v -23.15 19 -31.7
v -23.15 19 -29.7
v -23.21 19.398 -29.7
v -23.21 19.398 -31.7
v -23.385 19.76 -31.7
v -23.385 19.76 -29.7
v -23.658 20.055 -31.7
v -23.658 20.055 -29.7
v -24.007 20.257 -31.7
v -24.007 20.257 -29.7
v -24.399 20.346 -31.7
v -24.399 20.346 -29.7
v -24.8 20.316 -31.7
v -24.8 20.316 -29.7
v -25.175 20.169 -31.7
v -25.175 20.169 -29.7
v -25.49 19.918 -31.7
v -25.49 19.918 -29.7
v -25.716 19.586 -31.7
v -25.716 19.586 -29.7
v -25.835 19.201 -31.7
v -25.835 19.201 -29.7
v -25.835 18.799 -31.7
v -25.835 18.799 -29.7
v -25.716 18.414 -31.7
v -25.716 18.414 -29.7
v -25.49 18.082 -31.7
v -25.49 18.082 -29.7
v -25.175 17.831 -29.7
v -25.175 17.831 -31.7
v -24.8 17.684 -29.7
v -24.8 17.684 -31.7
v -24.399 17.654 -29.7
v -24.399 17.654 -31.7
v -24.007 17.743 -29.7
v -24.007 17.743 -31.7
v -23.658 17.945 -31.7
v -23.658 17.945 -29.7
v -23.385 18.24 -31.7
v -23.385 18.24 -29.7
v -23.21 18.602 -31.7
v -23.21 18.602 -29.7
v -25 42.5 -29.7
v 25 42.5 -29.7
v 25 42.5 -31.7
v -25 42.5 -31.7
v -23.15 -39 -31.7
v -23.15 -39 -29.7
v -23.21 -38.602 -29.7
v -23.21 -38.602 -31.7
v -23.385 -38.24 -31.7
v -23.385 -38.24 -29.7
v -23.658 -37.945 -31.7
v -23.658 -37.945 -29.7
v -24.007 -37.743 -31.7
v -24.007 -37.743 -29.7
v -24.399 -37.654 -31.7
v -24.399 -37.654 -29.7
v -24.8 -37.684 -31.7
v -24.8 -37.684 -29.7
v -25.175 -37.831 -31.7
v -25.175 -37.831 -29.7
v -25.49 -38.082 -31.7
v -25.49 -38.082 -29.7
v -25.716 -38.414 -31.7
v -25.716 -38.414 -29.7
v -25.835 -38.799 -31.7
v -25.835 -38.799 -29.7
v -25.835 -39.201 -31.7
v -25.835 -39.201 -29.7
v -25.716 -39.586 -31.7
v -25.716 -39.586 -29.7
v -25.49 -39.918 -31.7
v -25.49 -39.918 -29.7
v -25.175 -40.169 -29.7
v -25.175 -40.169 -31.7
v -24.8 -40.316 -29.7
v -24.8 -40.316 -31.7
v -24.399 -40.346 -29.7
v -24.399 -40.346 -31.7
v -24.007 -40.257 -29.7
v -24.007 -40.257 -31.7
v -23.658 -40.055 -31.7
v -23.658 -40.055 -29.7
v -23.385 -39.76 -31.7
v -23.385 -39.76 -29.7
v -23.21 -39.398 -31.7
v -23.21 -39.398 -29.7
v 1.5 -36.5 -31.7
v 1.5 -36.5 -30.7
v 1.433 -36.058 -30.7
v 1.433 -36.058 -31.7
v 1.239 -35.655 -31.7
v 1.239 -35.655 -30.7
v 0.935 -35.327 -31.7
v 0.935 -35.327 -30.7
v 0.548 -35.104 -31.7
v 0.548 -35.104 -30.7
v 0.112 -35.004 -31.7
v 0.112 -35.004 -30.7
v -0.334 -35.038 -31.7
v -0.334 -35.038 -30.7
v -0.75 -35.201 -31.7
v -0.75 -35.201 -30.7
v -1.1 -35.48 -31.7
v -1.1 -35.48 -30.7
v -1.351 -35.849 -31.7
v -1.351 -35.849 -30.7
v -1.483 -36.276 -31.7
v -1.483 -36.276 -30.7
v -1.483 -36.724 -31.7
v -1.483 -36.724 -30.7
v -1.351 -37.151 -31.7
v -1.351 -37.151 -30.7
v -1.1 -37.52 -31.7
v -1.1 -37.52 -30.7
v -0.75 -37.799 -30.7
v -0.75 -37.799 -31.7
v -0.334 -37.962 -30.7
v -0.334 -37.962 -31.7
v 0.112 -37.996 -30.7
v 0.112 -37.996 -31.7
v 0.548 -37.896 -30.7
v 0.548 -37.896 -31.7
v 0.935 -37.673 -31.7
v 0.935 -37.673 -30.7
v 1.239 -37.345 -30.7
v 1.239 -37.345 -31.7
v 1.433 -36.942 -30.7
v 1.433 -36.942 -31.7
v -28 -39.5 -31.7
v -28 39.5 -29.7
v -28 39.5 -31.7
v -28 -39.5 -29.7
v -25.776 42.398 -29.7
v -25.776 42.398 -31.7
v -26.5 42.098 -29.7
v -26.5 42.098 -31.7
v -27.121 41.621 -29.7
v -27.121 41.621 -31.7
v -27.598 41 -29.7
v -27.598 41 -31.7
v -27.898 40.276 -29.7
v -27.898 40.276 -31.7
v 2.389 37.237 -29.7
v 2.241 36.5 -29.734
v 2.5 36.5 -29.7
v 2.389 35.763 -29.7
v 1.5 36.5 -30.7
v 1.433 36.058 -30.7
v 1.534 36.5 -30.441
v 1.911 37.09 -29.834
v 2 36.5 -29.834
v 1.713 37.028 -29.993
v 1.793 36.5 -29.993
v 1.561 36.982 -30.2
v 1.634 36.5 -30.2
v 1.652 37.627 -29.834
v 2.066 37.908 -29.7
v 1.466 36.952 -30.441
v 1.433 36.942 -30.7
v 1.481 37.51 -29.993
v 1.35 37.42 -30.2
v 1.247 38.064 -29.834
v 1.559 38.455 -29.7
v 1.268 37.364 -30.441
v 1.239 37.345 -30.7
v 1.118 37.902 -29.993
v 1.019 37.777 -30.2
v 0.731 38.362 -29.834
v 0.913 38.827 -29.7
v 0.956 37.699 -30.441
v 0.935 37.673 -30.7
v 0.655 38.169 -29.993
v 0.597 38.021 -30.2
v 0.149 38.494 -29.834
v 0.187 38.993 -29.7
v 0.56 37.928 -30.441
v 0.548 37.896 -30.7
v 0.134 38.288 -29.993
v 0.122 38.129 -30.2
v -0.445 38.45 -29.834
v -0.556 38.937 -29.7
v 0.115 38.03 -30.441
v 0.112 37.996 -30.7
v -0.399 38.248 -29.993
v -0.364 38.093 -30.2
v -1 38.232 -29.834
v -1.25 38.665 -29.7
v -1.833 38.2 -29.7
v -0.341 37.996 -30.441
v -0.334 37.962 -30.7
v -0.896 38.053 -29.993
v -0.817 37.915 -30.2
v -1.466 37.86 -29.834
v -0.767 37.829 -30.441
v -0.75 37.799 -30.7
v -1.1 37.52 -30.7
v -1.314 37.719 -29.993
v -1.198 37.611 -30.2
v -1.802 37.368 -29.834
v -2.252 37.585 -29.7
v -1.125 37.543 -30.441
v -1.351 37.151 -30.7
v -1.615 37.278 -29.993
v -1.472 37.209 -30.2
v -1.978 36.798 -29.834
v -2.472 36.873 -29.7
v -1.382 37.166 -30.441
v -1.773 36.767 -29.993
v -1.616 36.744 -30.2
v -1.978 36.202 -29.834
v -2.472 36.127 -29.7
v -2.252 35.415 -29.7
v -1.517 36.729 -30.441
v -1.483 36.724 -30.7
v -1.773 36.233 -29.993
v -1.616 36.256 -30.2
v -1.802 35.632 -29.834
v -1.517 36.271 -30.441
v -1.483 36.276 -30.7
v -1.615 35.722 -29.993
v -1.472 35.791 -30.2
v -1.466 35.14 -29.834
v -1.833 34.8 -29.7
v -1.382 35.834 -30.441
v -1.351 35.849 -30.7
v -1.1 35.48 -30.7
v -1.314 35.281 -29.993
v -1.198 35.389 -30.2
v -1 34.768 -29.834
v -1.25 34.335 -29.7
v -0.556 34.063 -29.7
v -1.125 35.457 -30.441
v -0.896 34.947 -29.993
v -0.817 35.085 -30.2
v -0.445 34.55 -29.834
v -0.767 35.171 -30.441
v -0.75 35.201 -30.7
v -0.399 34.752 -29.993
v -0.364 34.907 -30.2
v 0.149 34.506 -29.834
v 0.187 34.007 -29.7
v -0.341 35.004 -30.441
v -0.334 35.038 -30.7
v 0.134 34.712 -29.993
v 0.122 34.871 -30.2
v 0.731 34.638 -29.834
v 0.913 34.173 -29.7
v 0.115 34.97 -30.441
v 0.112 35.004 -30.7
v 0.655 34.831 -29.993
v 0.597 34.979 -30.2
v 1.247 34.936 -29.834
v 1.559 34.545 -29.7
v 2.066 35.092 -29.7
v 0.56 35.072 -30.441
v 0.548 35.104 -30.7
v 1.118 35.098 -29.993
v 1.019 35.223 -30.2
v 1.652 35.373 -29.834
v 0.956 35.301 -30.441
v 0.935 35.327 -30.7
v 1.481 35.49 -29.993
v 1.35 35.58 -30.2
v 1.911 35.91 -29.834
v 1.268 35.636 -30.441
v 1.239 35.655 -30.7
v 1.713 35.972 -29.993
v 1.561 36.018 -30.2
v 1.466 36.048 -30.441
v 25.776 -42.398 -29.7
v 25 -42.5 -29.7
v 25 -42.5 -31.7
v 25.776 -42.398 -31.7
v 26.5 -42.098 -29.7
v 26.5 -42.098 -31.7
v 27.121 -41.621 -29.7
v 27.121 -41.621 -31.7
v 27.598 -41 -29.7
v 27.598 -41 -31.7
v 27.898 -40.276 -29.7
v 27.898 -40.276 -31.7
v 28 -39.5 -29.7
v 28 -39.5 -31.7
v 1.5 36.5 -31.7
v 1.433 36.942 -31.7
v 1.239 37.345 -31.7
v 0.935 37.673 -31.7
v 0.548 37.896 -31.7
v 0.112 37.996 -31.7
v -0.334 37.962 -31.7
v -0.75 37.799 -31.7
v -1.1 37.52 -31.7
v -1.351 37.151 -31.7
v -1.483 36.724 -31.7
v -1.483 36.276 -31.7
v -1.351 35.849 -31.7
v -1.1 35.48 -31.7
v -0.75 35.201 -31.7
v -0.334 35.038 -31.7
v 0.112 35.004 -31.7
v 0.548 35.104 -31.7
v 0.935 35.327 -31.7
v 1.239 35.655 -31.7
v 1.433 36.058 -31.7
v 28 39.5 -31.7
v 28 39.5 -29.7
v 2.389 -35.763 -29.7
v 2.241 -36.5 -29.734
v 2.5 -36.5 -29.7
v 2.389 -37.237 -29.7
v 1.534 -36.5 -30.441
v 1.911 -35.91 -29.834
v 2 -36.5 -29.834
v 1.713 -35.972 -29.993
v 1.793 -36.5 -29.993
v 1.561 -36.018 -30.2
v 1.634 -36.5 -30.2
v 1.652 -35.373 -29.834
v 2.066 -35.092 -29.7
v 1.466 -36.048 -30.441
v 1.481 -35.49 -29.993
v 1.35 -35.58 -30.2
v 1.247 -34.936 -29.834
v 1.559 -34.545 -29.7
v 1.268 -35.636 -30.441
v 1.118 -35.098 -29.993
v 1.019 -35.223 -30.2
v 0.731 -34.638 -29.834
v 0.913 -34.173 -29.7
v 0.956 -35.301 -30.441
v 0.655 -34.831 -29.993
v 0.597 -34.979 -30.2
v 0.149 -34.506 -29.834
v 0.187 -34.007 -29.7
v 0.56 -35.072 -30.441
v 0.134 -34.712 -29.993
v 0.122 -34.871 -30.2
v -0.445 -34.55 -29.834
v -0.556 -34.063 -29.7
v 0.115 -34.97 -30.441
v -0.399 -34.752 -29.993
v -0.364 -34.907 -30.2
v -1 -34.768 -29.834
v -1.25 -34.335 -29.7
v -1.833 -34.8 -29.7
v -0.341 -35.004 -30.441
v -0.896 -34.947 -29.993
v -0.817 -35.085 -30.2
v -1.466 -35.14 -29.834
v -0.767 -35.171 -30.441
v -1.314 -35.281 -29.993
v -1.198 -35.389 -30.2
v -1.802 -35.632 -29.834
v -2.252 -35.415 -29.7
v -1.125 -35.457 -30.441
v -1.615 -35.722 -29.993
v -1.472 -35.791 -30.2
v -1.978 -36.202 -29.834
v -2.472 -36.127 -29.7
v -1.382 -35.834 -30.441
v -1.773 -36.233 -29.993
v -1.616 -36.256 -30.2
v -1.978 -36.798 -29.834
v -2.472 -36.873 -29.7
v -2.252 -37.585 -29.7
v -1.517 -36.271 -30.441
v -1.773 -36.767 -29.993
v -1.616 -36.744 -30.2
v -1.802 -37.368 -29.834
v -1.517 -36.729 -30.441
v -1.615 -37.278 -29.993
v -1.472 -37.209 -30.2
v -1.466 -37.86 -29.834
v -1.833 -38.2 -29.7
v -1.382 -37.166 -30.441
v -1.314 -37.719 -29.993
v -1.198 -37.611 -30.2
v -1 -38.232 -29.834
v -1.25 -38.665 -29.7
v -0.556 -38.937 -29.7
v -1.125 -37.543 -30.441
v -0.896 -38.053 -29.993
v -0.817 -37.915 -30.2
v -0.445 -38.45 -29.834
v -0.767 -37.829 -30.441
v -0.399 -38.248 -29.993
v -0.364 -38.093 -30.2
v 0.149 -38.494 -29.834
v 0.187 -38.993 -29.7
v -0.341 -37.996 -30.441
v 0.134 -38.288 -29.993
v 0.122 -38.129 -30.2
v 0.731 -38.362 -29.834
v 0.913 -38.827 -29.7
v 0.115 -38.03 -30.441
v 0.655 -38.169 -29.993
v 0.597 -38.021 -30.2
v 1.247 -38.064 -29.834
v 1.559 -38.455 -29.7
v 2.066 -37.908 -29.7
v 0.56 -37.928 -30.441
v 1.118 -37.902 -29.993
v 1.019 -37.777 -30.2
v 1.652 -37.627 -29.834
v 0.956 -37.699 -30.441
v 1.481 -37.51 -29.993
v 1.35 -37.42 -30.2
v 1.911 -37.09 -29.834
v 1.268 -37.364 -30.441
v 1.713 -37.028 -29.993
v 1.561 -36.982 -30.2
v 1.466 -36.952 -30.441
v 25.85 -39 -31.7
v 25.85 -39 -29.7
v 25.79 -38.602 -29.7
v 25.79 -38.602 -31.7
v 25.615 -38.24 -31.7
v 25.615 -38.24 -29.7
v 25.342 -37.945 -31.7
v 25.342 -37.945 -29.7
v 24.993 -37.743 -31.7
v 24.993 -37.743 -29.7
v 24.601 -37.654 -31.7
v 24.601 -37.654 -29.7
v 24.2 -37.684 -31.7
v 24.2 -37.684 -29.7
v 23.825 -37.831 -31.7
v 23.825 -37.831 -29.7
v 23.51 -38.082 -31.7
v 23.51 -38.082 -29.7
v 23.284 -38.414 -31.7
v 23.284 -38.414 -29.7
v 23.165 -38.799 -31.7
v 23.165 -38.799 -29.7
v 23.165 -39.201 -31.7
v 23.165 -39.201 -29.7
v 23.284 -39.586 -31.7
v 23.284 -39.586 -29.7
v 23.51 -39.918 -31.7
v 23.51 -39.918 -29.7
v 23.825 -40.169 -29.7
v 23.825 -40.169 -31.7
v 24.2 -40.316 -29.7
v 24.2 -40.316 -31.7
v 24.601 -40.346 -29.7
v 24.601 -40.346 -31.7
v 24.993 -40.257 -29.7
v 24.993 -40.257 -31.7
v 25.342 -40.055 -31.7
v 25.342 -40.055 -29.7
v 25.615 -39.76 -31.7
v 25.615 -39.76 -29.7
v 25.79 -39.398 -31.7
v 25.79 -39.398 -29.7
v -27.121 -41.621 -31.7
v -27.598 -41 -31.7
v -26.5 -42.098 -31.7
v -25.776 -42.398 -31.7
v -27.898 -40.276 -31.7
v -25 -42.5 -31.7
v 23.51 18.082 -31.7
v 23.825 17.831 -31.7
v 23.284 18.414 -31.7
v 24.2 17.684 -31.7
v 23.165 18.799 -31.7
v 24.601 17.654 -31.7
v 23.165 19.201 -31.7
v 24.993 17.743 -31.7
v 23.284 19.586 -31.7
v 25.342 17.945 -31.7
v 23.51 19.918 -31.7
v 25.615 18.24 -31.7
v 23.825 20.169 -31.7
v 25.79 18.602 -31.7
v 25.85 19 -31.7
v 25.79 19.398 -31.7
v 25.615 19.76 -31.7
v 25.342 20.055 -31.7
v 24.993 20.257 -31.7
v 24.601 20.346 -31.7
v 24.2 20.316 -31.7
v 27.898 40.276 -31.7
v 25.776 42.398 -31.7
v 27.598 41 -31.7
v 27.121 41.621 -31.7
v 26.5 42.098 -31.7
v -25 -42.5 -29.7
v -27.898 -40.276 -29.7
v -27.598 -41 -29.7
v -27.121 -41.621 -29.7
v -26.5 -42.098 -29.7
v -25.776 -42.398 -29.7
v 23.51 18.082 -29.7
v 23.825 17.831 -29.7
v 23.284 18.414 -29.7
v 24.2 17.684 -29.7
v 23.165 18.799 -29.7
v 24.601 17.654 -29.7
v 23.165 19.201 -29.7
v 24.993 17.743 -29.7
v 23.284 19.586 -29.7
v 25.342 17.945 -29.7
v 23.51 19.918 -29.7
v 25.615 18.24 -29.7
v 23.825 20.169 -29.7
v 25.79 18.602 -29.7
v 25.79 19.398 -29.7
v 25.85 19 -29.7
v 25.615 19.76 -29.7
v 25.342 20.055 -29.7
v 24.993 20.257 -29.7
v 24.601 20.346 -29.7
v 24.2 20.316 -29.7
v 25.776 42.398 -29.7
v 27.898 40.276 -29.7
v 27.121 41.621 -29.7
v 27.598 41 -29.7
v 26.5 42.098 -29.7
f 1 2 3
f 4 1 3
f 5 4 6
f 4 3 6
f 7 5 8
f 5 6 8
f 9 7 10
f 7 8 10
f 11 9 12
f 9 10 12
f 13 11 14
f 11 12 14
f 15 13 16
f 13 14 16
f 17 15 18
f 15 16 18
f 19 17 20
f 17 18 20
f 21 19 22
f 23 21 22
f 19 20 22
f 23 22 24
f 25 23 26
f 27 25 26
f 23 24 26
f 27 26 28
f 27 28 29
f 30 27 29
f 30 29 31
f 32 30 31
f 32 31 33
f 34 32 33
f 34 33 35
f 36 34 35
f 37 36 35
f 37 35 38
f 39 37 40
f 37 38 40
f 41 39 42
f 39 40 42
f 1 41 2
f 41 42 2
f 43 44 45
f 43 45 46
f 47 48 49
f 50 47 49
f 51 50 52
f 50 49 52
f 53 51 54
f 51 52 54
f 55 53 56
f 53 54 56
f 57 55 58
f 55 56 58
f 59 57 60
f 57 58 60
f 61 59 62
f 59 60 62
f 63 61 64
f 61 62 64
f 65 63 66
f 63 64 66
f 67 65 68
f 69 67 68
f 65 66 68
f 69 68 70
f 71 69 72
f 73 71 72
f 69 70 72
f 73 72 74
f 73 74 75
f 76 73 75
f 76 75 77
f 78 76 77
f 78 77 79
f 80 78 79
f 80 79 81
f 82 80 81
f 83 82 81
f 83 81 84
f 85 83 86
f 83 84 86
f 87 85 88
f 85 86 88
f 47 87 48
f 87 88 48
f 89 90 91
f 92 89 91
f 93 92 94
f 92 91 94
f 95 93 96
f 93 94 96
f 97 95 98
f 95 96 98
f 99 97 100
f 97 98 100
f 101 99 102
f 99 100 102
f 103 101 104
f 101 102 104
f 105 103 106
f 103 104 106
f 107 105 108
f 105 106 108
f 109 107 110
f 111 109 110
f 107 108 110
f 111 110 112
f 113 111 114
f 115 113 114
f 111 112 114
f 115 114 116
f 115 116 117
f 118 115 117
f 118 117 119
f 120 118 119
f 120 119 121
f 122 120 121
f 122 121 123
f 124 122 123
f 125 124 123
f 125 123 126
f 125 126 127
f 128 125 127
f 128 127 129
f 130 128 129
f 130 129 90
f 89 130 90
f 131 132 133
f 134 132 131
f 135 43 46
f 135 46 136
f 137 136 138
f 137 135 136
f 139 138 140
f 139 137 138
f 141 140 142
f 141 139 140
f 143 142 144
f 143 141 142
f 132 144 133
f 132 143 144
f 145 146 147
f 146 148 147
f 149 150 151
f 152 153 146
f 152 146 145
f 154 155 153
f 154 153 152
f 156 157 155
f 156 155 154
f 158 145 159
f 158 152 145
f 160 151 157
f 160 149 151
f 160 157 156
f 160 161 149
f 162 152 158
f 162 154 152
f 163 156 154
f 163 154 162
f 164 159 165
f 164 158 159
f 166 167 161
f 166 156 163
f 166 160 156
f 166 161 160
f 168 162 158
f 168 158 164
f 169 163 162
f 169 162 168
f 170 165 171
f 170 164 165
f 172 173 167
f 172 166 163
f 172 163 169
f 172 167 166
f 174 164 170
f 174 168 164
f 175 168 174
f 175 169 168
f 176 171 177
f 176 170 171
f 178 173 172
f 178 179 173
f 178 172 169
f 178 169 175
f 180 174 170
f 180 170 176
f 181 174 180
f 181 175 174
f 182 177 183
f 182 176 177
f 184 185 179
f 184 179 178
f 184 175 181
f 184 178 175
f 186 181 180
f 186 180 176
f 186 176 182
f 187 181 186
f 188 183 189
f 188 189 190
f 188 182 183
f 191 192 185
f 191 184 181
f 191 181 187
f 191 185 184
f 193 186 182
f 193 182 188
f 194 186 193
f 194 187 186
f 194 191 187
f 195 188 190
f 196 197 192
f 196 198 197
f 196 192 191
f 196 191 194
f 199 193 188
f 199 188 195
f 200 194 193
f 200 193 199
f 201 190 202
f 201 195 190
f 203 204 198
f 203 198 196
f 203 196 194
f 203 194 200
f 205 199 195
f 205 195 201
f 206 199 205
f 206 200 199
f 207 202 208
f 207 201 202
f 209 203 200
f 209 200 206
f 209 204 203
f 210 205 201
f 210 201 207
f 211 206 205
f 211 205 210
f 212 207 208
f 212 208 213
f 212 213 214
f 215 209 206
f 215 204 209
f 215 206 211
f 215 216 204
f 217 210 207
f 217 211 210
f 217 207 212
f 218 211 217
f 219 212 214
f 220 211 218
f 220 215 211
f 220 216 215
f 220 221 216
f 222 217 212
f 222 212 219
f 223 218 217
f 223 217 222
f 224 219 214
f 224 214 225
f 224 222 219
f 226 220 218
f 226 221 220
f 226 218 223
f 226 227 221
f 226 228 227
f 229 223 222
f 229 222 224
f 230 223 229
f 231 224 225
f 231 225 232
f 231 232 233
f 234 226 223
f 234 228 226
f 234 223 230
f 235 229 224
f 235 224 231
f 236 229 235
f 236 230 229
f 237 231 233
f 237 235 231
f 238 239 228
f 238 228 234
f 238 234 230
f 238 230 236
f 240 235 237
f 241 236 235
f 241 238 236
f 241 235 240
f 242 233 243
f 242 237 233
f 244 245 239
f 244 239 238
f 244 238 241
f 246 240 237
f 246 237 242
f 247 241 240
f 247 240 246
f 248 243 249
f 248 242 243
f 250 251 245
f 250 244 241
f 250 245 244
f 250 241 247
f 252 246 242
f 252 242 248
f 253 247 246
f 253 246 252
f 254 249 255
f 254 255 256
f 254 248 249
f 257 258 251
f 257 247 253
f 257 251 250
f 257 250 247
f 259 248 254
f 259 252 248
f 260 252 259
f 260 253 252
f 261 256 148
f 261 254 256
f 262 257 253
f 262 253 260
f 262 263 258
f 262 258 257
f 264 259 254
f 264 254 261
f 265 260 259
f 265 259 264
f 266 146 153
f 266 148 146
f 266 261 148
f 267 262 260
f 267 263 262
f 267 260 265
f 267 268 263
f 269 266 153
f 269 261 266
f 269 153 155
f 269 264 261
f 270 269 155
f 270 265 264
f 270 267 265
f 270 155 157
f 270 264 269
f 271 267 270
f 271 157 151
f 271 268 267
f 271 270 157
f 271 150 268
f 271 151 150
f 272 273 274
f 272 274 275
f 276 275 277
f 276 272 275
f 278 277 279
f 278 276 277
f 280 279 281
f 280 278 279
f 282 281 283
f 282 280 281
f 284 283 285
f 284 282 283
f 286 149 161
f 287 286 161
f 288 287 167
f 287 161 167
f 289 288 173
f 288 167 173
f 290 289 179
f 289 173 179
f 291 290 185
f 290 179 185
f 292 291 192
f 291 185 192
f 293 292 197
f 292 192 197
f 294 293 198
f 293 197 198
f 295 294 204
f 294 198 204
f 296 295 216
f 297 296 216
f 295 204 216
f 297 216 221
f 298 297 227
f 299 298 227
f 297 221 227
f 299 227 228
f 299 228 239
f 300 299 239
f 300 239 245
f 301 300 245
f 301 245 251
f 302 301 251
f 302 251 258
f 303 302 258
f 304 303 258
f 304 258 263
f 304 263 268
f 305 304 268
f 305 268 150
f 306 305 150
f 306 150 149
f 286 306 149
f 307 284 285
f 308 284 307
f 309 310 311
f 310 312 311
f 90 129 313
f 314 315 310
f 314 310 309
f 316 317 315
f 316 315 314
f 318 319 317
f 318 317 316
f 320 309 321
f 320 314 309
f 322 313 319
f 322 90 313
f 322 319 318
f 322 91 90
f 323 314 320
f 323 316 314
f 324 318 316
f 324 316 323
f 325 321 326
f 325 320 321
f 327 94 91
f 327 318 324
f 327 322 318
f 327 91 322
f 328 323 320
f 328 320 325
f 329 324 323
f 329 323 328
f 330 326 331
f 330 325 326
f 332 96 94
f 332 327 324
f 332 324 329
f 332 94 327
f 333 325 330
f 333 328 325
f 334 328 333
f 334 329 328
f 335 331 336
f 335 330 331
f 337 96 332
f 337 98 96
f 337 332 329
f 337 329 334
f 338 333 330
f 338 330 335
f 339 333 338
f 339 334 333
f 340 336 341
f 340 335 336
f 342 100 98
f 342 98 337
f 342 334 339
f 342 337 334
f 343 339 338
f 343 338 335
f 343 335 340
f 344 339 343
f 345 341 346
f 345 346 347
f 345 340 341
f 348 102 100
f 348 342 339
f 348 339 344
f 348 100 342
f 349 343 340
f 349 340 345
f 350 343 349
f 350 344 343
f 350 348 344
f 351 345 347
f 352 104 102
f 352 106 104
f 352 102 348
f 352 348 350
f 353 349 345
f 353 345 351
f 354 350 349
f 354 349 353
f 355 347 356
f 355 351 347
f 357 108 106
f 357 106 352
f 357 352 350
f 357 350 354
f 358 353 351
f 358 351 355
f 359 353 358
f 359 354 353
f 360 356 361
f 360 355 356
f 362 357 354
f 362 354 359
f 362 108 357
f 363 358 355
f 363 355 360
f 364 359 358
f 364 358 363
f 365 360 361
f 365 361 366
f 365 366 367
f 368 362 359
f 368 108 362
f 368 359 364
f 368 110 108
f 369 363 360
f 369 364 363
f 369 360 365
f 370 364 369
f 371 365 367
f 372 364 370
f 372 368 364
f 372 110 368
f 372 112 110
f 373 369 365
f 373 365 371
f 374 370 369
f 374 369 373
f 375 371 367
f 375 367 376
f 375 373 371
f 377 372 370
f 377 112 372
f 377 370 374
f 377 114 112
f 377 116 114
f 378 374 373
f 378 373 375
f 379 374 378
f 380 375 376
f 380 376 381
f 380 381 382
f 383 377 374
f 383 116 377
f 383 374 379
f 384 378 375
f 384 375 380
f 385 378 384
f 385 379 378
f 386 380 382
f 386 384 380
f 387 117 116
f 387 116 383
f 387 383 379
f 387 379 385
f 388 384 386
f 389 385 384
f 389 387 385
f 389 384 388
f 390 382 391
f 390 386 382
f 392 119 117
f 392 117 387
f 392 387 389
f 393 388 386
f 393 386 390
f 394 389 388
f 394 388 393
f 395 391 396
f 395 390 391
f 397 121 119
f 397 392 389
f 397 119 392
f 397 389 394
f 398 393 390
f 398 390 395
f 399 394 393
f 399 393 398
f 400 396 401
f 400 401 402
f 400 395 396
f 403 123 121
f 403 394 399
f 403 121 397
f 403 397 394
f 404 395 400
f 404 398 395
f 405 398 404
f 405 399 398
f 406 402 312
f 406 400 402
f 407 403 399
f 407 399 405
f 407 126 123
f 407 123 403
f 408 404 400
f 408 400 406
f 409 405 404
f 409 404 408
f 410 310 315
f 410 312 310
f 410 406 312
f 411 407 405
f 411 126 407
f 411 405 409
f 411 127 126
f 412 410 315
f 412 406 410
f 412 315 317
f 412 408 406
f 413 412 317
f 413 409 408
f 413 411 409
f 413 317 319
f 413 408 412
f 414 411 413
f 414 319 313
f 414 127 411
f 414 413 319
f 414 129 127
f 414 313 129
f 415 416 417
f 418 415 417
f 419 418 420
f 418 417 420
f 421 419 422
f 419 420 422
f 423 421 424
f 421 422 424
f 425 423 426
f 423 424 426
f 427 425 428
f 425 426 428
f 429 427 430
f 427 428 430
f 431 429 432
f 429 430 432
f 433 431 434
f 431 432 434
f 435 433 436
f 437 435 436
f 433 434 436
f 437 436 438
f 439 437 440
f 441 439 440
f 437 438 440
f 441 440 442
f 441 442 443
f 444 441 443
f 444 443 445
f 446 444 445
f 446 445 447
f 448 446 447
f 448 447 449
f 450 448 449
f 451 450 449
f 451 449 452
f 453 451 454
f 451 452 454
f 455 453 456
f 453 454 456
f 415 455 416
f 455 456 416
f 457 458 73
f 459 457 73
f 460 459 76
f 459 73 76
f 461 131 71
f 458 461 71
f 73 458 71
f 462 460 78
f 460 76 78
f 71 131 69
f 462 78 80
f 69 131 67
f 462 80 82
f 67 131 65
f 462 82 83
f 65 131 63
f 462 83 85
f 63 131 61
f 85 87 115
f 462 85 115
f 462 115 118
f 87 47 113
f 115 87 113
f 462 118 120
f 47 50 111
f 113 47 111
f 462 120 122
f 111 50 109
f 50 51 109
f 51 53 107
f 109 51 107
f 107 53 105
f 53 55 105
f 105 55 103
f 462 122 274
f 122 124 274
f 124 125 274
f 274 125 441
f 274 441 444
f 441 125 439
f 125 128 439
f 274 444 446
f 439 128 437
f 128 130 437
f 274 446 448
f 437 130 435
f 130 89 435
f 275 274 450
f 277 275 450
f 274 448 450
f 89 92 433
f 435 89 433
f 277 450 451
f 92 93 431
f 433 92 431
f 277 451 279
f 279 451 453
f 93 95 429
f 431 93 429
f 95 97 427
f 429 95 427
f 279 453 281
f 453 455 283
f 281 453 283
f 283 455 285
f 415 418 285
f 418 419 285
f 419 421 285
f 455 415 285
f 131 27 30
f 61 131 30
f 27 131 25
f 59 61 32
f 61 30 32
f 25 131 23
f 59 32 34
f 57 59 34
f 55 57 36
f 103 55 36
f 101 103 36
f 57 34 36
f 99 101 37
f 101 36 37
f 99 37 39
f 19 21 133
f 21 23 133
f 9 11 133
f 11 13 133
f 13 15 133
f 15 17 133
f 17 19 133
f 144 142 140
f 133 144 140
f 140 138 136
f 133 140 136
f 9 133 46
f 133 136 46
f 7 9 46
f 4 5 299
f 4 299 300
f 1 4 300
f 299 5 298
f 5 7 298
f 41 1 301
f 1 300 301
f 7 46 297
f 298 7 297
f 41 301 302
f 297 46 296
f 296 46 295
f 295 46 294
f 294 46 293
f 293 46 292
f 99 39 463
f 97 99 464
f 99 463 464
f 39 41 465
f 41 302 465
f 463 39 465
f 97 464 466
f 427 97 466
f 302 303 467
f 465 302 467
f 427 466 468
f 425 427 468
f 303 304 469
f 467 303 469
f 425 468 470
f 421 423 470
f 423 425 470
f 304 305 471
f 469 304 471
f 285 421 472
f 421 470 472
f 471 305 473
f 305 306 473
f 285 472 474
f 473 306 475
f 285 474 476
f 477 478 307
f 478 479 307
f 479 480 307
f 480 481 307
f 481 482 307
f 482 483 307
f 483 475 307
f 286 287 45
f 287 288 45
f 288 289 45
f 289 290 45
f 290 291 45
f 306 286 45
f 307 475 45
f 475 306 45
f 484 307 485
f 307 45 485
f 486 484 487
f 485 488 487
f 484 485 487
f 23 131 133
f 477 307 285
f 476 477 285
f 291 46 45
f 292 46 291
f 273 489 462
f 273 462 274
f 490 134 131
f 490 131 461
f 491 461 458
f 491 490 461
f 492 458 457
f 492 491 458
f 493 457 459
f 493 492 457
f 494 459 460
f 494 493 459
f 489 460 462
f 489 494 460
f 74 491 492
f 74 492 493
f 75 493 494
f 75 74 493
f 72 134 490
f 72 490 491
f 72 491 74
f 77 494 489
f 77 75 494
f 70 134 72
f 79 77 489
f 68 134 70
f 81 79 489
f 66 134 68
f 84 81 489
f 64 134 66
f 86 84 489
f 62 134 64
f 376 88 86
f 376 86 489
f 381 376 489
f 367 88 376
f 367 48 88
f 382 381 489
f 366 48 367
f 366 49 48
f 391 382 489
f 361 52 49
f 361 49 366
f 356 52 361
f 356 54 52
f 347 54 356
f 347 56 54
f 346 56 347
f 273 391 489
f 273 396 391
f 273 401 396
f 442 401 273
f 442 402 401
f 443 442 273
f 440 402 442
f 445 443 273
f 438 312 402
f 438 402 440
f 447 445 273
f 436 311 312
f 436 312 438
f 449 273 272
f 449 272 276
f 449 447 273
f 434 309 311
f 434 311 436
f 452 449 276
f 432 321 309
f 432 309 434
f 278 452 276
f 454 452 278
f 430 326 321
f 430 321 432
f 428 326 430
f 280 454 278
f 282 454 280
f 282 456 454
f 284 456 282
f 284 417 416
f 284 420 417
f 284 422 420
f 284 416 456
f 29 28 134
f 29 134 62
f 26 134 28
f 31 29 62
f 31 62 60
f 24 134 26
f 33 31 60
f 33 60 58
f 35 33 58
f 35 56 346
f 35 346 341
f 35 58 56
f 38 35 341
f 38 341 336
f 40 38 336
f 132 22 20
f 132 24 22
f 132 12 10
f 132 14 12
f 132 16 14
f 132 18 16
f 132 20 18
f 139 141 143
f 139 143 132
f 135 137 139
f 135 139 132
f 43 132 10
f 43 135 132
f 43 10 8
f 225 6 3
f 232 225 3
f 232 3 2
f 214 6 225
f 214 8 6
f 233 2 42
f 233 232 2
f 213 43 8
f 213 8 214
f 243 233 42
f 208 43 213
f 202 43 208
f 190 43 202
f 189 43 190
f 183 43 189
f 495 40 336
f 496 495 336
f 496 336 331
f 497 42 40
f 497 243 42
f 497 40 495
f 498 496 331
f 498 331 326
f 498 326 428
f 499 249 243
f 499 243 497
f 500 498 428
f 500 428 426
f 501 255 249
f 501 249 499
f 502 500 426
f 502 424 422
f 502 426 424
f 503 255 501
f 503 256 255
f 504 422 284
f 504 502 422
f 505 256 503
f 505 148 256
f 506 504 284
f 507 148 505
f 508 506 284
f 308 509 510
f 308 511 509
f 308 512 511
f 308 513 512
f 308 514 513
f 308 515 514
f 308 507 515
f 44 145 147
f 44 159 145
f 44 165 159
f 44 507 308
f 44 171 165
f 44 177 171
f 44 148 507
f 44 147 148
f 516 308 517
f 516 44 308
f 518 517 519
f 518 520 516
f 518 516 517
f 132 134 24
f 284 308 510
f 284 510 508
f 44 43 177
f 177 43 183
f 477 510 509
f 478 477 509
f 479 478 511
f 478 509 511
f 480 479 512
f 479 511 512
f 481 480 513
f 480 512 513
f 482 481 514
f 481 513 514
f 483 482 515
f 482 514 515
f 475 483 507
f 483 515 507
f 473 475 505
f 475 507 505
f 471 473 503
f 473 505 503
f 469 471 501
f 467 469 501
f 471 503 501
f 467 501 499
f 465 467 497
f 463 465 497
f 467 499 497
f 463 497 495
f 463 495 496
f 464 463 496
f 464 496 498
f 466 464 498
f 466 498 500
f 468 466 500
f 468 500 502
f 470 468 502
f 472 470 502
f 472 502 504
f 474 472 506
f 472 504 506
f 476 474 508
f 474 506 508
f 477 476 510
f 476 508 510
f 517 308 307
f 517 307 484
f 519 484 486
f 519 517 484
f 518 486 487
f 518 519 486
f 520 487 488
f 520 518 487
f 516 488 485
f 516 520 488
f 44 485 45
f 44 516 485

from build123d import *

# Parameters (mm, degrees)
SKETCH010_R     = 1.35
PAD005_DEPTH    = 2
SKETCH011_R     = 1.5
POCKET003_DEPTH = 2.001
FILLET003_R     = 1


with BuildPart() as part:
    # Sketch010 → Pad005 (new body)
    with BuildSketch(Plane.XY):
        with BuildLine():
            Line((-28, 39.5), (-28, -39.5))
            ThreePointArc((-28, -39.5), (-27.12132, -41.62132), (-25, -42.5))
            Line((-25, -42.5), (25, -42.5))
            ThreePointArc((25, -42.5), (27.12132, -41.62132), (28, -39.5))
            Line((28, -39.5), (28, 39.5))
            ThreePointArc((28, 39.5), (27.12132, 41.62132), (25, 42.5))
            Line((25, 42.5), (-25, 42.5))
            ThreePointArc((-25, 42.5), (-27.12132, 41.62132), (-28, 39.5))
        make_face()
        with Locations((-24.5, 19)):
            Circle(SKETCH010_R, mode=Mode.SUBTRACT)
        with Locations((24.5, 19)):
            Circle(SKETCH010_R, mode=Mode.SUBTRACT)
        with Locations((24.5, -39)):
            Circle(SKETCH010_R, mode=Mode.SUBTRACT)
        with Locations((-24.5, -39)):
            Circle(SKETCH010_R, mode=Mode.SUBTRACT)
    extrude(amount=-PAD005_DEPTH)

    # Sketch011 (on Face13 of Pad005) → Pocket003 (cut, through all)
    with BuildSketch(Plane.XY):
        with Locations((0, 36.5)):
            Circle(SKETCH011_R)
        with Locations((0, -36.5)):
            Circle(SKETCH011_R)
    extrude(amount=-POCKET003_DEPTH, mode=Mode.SUBTRACT)

    # Fillet003
    fillet003_edges = [part.edges().sort_by_distance(p)[0] for p in [
        (-1.5, 36.5, 0),
        (-1.5, -36.5, 0),
    ]]
    fillet(fillet003_edges, radius=FILLET003_R)


with BuildPart() as part_1:
    # Body005 placement: moved
    add(part.part.moved(Location((0, 0, -29.7))))


solid = part_1.part
